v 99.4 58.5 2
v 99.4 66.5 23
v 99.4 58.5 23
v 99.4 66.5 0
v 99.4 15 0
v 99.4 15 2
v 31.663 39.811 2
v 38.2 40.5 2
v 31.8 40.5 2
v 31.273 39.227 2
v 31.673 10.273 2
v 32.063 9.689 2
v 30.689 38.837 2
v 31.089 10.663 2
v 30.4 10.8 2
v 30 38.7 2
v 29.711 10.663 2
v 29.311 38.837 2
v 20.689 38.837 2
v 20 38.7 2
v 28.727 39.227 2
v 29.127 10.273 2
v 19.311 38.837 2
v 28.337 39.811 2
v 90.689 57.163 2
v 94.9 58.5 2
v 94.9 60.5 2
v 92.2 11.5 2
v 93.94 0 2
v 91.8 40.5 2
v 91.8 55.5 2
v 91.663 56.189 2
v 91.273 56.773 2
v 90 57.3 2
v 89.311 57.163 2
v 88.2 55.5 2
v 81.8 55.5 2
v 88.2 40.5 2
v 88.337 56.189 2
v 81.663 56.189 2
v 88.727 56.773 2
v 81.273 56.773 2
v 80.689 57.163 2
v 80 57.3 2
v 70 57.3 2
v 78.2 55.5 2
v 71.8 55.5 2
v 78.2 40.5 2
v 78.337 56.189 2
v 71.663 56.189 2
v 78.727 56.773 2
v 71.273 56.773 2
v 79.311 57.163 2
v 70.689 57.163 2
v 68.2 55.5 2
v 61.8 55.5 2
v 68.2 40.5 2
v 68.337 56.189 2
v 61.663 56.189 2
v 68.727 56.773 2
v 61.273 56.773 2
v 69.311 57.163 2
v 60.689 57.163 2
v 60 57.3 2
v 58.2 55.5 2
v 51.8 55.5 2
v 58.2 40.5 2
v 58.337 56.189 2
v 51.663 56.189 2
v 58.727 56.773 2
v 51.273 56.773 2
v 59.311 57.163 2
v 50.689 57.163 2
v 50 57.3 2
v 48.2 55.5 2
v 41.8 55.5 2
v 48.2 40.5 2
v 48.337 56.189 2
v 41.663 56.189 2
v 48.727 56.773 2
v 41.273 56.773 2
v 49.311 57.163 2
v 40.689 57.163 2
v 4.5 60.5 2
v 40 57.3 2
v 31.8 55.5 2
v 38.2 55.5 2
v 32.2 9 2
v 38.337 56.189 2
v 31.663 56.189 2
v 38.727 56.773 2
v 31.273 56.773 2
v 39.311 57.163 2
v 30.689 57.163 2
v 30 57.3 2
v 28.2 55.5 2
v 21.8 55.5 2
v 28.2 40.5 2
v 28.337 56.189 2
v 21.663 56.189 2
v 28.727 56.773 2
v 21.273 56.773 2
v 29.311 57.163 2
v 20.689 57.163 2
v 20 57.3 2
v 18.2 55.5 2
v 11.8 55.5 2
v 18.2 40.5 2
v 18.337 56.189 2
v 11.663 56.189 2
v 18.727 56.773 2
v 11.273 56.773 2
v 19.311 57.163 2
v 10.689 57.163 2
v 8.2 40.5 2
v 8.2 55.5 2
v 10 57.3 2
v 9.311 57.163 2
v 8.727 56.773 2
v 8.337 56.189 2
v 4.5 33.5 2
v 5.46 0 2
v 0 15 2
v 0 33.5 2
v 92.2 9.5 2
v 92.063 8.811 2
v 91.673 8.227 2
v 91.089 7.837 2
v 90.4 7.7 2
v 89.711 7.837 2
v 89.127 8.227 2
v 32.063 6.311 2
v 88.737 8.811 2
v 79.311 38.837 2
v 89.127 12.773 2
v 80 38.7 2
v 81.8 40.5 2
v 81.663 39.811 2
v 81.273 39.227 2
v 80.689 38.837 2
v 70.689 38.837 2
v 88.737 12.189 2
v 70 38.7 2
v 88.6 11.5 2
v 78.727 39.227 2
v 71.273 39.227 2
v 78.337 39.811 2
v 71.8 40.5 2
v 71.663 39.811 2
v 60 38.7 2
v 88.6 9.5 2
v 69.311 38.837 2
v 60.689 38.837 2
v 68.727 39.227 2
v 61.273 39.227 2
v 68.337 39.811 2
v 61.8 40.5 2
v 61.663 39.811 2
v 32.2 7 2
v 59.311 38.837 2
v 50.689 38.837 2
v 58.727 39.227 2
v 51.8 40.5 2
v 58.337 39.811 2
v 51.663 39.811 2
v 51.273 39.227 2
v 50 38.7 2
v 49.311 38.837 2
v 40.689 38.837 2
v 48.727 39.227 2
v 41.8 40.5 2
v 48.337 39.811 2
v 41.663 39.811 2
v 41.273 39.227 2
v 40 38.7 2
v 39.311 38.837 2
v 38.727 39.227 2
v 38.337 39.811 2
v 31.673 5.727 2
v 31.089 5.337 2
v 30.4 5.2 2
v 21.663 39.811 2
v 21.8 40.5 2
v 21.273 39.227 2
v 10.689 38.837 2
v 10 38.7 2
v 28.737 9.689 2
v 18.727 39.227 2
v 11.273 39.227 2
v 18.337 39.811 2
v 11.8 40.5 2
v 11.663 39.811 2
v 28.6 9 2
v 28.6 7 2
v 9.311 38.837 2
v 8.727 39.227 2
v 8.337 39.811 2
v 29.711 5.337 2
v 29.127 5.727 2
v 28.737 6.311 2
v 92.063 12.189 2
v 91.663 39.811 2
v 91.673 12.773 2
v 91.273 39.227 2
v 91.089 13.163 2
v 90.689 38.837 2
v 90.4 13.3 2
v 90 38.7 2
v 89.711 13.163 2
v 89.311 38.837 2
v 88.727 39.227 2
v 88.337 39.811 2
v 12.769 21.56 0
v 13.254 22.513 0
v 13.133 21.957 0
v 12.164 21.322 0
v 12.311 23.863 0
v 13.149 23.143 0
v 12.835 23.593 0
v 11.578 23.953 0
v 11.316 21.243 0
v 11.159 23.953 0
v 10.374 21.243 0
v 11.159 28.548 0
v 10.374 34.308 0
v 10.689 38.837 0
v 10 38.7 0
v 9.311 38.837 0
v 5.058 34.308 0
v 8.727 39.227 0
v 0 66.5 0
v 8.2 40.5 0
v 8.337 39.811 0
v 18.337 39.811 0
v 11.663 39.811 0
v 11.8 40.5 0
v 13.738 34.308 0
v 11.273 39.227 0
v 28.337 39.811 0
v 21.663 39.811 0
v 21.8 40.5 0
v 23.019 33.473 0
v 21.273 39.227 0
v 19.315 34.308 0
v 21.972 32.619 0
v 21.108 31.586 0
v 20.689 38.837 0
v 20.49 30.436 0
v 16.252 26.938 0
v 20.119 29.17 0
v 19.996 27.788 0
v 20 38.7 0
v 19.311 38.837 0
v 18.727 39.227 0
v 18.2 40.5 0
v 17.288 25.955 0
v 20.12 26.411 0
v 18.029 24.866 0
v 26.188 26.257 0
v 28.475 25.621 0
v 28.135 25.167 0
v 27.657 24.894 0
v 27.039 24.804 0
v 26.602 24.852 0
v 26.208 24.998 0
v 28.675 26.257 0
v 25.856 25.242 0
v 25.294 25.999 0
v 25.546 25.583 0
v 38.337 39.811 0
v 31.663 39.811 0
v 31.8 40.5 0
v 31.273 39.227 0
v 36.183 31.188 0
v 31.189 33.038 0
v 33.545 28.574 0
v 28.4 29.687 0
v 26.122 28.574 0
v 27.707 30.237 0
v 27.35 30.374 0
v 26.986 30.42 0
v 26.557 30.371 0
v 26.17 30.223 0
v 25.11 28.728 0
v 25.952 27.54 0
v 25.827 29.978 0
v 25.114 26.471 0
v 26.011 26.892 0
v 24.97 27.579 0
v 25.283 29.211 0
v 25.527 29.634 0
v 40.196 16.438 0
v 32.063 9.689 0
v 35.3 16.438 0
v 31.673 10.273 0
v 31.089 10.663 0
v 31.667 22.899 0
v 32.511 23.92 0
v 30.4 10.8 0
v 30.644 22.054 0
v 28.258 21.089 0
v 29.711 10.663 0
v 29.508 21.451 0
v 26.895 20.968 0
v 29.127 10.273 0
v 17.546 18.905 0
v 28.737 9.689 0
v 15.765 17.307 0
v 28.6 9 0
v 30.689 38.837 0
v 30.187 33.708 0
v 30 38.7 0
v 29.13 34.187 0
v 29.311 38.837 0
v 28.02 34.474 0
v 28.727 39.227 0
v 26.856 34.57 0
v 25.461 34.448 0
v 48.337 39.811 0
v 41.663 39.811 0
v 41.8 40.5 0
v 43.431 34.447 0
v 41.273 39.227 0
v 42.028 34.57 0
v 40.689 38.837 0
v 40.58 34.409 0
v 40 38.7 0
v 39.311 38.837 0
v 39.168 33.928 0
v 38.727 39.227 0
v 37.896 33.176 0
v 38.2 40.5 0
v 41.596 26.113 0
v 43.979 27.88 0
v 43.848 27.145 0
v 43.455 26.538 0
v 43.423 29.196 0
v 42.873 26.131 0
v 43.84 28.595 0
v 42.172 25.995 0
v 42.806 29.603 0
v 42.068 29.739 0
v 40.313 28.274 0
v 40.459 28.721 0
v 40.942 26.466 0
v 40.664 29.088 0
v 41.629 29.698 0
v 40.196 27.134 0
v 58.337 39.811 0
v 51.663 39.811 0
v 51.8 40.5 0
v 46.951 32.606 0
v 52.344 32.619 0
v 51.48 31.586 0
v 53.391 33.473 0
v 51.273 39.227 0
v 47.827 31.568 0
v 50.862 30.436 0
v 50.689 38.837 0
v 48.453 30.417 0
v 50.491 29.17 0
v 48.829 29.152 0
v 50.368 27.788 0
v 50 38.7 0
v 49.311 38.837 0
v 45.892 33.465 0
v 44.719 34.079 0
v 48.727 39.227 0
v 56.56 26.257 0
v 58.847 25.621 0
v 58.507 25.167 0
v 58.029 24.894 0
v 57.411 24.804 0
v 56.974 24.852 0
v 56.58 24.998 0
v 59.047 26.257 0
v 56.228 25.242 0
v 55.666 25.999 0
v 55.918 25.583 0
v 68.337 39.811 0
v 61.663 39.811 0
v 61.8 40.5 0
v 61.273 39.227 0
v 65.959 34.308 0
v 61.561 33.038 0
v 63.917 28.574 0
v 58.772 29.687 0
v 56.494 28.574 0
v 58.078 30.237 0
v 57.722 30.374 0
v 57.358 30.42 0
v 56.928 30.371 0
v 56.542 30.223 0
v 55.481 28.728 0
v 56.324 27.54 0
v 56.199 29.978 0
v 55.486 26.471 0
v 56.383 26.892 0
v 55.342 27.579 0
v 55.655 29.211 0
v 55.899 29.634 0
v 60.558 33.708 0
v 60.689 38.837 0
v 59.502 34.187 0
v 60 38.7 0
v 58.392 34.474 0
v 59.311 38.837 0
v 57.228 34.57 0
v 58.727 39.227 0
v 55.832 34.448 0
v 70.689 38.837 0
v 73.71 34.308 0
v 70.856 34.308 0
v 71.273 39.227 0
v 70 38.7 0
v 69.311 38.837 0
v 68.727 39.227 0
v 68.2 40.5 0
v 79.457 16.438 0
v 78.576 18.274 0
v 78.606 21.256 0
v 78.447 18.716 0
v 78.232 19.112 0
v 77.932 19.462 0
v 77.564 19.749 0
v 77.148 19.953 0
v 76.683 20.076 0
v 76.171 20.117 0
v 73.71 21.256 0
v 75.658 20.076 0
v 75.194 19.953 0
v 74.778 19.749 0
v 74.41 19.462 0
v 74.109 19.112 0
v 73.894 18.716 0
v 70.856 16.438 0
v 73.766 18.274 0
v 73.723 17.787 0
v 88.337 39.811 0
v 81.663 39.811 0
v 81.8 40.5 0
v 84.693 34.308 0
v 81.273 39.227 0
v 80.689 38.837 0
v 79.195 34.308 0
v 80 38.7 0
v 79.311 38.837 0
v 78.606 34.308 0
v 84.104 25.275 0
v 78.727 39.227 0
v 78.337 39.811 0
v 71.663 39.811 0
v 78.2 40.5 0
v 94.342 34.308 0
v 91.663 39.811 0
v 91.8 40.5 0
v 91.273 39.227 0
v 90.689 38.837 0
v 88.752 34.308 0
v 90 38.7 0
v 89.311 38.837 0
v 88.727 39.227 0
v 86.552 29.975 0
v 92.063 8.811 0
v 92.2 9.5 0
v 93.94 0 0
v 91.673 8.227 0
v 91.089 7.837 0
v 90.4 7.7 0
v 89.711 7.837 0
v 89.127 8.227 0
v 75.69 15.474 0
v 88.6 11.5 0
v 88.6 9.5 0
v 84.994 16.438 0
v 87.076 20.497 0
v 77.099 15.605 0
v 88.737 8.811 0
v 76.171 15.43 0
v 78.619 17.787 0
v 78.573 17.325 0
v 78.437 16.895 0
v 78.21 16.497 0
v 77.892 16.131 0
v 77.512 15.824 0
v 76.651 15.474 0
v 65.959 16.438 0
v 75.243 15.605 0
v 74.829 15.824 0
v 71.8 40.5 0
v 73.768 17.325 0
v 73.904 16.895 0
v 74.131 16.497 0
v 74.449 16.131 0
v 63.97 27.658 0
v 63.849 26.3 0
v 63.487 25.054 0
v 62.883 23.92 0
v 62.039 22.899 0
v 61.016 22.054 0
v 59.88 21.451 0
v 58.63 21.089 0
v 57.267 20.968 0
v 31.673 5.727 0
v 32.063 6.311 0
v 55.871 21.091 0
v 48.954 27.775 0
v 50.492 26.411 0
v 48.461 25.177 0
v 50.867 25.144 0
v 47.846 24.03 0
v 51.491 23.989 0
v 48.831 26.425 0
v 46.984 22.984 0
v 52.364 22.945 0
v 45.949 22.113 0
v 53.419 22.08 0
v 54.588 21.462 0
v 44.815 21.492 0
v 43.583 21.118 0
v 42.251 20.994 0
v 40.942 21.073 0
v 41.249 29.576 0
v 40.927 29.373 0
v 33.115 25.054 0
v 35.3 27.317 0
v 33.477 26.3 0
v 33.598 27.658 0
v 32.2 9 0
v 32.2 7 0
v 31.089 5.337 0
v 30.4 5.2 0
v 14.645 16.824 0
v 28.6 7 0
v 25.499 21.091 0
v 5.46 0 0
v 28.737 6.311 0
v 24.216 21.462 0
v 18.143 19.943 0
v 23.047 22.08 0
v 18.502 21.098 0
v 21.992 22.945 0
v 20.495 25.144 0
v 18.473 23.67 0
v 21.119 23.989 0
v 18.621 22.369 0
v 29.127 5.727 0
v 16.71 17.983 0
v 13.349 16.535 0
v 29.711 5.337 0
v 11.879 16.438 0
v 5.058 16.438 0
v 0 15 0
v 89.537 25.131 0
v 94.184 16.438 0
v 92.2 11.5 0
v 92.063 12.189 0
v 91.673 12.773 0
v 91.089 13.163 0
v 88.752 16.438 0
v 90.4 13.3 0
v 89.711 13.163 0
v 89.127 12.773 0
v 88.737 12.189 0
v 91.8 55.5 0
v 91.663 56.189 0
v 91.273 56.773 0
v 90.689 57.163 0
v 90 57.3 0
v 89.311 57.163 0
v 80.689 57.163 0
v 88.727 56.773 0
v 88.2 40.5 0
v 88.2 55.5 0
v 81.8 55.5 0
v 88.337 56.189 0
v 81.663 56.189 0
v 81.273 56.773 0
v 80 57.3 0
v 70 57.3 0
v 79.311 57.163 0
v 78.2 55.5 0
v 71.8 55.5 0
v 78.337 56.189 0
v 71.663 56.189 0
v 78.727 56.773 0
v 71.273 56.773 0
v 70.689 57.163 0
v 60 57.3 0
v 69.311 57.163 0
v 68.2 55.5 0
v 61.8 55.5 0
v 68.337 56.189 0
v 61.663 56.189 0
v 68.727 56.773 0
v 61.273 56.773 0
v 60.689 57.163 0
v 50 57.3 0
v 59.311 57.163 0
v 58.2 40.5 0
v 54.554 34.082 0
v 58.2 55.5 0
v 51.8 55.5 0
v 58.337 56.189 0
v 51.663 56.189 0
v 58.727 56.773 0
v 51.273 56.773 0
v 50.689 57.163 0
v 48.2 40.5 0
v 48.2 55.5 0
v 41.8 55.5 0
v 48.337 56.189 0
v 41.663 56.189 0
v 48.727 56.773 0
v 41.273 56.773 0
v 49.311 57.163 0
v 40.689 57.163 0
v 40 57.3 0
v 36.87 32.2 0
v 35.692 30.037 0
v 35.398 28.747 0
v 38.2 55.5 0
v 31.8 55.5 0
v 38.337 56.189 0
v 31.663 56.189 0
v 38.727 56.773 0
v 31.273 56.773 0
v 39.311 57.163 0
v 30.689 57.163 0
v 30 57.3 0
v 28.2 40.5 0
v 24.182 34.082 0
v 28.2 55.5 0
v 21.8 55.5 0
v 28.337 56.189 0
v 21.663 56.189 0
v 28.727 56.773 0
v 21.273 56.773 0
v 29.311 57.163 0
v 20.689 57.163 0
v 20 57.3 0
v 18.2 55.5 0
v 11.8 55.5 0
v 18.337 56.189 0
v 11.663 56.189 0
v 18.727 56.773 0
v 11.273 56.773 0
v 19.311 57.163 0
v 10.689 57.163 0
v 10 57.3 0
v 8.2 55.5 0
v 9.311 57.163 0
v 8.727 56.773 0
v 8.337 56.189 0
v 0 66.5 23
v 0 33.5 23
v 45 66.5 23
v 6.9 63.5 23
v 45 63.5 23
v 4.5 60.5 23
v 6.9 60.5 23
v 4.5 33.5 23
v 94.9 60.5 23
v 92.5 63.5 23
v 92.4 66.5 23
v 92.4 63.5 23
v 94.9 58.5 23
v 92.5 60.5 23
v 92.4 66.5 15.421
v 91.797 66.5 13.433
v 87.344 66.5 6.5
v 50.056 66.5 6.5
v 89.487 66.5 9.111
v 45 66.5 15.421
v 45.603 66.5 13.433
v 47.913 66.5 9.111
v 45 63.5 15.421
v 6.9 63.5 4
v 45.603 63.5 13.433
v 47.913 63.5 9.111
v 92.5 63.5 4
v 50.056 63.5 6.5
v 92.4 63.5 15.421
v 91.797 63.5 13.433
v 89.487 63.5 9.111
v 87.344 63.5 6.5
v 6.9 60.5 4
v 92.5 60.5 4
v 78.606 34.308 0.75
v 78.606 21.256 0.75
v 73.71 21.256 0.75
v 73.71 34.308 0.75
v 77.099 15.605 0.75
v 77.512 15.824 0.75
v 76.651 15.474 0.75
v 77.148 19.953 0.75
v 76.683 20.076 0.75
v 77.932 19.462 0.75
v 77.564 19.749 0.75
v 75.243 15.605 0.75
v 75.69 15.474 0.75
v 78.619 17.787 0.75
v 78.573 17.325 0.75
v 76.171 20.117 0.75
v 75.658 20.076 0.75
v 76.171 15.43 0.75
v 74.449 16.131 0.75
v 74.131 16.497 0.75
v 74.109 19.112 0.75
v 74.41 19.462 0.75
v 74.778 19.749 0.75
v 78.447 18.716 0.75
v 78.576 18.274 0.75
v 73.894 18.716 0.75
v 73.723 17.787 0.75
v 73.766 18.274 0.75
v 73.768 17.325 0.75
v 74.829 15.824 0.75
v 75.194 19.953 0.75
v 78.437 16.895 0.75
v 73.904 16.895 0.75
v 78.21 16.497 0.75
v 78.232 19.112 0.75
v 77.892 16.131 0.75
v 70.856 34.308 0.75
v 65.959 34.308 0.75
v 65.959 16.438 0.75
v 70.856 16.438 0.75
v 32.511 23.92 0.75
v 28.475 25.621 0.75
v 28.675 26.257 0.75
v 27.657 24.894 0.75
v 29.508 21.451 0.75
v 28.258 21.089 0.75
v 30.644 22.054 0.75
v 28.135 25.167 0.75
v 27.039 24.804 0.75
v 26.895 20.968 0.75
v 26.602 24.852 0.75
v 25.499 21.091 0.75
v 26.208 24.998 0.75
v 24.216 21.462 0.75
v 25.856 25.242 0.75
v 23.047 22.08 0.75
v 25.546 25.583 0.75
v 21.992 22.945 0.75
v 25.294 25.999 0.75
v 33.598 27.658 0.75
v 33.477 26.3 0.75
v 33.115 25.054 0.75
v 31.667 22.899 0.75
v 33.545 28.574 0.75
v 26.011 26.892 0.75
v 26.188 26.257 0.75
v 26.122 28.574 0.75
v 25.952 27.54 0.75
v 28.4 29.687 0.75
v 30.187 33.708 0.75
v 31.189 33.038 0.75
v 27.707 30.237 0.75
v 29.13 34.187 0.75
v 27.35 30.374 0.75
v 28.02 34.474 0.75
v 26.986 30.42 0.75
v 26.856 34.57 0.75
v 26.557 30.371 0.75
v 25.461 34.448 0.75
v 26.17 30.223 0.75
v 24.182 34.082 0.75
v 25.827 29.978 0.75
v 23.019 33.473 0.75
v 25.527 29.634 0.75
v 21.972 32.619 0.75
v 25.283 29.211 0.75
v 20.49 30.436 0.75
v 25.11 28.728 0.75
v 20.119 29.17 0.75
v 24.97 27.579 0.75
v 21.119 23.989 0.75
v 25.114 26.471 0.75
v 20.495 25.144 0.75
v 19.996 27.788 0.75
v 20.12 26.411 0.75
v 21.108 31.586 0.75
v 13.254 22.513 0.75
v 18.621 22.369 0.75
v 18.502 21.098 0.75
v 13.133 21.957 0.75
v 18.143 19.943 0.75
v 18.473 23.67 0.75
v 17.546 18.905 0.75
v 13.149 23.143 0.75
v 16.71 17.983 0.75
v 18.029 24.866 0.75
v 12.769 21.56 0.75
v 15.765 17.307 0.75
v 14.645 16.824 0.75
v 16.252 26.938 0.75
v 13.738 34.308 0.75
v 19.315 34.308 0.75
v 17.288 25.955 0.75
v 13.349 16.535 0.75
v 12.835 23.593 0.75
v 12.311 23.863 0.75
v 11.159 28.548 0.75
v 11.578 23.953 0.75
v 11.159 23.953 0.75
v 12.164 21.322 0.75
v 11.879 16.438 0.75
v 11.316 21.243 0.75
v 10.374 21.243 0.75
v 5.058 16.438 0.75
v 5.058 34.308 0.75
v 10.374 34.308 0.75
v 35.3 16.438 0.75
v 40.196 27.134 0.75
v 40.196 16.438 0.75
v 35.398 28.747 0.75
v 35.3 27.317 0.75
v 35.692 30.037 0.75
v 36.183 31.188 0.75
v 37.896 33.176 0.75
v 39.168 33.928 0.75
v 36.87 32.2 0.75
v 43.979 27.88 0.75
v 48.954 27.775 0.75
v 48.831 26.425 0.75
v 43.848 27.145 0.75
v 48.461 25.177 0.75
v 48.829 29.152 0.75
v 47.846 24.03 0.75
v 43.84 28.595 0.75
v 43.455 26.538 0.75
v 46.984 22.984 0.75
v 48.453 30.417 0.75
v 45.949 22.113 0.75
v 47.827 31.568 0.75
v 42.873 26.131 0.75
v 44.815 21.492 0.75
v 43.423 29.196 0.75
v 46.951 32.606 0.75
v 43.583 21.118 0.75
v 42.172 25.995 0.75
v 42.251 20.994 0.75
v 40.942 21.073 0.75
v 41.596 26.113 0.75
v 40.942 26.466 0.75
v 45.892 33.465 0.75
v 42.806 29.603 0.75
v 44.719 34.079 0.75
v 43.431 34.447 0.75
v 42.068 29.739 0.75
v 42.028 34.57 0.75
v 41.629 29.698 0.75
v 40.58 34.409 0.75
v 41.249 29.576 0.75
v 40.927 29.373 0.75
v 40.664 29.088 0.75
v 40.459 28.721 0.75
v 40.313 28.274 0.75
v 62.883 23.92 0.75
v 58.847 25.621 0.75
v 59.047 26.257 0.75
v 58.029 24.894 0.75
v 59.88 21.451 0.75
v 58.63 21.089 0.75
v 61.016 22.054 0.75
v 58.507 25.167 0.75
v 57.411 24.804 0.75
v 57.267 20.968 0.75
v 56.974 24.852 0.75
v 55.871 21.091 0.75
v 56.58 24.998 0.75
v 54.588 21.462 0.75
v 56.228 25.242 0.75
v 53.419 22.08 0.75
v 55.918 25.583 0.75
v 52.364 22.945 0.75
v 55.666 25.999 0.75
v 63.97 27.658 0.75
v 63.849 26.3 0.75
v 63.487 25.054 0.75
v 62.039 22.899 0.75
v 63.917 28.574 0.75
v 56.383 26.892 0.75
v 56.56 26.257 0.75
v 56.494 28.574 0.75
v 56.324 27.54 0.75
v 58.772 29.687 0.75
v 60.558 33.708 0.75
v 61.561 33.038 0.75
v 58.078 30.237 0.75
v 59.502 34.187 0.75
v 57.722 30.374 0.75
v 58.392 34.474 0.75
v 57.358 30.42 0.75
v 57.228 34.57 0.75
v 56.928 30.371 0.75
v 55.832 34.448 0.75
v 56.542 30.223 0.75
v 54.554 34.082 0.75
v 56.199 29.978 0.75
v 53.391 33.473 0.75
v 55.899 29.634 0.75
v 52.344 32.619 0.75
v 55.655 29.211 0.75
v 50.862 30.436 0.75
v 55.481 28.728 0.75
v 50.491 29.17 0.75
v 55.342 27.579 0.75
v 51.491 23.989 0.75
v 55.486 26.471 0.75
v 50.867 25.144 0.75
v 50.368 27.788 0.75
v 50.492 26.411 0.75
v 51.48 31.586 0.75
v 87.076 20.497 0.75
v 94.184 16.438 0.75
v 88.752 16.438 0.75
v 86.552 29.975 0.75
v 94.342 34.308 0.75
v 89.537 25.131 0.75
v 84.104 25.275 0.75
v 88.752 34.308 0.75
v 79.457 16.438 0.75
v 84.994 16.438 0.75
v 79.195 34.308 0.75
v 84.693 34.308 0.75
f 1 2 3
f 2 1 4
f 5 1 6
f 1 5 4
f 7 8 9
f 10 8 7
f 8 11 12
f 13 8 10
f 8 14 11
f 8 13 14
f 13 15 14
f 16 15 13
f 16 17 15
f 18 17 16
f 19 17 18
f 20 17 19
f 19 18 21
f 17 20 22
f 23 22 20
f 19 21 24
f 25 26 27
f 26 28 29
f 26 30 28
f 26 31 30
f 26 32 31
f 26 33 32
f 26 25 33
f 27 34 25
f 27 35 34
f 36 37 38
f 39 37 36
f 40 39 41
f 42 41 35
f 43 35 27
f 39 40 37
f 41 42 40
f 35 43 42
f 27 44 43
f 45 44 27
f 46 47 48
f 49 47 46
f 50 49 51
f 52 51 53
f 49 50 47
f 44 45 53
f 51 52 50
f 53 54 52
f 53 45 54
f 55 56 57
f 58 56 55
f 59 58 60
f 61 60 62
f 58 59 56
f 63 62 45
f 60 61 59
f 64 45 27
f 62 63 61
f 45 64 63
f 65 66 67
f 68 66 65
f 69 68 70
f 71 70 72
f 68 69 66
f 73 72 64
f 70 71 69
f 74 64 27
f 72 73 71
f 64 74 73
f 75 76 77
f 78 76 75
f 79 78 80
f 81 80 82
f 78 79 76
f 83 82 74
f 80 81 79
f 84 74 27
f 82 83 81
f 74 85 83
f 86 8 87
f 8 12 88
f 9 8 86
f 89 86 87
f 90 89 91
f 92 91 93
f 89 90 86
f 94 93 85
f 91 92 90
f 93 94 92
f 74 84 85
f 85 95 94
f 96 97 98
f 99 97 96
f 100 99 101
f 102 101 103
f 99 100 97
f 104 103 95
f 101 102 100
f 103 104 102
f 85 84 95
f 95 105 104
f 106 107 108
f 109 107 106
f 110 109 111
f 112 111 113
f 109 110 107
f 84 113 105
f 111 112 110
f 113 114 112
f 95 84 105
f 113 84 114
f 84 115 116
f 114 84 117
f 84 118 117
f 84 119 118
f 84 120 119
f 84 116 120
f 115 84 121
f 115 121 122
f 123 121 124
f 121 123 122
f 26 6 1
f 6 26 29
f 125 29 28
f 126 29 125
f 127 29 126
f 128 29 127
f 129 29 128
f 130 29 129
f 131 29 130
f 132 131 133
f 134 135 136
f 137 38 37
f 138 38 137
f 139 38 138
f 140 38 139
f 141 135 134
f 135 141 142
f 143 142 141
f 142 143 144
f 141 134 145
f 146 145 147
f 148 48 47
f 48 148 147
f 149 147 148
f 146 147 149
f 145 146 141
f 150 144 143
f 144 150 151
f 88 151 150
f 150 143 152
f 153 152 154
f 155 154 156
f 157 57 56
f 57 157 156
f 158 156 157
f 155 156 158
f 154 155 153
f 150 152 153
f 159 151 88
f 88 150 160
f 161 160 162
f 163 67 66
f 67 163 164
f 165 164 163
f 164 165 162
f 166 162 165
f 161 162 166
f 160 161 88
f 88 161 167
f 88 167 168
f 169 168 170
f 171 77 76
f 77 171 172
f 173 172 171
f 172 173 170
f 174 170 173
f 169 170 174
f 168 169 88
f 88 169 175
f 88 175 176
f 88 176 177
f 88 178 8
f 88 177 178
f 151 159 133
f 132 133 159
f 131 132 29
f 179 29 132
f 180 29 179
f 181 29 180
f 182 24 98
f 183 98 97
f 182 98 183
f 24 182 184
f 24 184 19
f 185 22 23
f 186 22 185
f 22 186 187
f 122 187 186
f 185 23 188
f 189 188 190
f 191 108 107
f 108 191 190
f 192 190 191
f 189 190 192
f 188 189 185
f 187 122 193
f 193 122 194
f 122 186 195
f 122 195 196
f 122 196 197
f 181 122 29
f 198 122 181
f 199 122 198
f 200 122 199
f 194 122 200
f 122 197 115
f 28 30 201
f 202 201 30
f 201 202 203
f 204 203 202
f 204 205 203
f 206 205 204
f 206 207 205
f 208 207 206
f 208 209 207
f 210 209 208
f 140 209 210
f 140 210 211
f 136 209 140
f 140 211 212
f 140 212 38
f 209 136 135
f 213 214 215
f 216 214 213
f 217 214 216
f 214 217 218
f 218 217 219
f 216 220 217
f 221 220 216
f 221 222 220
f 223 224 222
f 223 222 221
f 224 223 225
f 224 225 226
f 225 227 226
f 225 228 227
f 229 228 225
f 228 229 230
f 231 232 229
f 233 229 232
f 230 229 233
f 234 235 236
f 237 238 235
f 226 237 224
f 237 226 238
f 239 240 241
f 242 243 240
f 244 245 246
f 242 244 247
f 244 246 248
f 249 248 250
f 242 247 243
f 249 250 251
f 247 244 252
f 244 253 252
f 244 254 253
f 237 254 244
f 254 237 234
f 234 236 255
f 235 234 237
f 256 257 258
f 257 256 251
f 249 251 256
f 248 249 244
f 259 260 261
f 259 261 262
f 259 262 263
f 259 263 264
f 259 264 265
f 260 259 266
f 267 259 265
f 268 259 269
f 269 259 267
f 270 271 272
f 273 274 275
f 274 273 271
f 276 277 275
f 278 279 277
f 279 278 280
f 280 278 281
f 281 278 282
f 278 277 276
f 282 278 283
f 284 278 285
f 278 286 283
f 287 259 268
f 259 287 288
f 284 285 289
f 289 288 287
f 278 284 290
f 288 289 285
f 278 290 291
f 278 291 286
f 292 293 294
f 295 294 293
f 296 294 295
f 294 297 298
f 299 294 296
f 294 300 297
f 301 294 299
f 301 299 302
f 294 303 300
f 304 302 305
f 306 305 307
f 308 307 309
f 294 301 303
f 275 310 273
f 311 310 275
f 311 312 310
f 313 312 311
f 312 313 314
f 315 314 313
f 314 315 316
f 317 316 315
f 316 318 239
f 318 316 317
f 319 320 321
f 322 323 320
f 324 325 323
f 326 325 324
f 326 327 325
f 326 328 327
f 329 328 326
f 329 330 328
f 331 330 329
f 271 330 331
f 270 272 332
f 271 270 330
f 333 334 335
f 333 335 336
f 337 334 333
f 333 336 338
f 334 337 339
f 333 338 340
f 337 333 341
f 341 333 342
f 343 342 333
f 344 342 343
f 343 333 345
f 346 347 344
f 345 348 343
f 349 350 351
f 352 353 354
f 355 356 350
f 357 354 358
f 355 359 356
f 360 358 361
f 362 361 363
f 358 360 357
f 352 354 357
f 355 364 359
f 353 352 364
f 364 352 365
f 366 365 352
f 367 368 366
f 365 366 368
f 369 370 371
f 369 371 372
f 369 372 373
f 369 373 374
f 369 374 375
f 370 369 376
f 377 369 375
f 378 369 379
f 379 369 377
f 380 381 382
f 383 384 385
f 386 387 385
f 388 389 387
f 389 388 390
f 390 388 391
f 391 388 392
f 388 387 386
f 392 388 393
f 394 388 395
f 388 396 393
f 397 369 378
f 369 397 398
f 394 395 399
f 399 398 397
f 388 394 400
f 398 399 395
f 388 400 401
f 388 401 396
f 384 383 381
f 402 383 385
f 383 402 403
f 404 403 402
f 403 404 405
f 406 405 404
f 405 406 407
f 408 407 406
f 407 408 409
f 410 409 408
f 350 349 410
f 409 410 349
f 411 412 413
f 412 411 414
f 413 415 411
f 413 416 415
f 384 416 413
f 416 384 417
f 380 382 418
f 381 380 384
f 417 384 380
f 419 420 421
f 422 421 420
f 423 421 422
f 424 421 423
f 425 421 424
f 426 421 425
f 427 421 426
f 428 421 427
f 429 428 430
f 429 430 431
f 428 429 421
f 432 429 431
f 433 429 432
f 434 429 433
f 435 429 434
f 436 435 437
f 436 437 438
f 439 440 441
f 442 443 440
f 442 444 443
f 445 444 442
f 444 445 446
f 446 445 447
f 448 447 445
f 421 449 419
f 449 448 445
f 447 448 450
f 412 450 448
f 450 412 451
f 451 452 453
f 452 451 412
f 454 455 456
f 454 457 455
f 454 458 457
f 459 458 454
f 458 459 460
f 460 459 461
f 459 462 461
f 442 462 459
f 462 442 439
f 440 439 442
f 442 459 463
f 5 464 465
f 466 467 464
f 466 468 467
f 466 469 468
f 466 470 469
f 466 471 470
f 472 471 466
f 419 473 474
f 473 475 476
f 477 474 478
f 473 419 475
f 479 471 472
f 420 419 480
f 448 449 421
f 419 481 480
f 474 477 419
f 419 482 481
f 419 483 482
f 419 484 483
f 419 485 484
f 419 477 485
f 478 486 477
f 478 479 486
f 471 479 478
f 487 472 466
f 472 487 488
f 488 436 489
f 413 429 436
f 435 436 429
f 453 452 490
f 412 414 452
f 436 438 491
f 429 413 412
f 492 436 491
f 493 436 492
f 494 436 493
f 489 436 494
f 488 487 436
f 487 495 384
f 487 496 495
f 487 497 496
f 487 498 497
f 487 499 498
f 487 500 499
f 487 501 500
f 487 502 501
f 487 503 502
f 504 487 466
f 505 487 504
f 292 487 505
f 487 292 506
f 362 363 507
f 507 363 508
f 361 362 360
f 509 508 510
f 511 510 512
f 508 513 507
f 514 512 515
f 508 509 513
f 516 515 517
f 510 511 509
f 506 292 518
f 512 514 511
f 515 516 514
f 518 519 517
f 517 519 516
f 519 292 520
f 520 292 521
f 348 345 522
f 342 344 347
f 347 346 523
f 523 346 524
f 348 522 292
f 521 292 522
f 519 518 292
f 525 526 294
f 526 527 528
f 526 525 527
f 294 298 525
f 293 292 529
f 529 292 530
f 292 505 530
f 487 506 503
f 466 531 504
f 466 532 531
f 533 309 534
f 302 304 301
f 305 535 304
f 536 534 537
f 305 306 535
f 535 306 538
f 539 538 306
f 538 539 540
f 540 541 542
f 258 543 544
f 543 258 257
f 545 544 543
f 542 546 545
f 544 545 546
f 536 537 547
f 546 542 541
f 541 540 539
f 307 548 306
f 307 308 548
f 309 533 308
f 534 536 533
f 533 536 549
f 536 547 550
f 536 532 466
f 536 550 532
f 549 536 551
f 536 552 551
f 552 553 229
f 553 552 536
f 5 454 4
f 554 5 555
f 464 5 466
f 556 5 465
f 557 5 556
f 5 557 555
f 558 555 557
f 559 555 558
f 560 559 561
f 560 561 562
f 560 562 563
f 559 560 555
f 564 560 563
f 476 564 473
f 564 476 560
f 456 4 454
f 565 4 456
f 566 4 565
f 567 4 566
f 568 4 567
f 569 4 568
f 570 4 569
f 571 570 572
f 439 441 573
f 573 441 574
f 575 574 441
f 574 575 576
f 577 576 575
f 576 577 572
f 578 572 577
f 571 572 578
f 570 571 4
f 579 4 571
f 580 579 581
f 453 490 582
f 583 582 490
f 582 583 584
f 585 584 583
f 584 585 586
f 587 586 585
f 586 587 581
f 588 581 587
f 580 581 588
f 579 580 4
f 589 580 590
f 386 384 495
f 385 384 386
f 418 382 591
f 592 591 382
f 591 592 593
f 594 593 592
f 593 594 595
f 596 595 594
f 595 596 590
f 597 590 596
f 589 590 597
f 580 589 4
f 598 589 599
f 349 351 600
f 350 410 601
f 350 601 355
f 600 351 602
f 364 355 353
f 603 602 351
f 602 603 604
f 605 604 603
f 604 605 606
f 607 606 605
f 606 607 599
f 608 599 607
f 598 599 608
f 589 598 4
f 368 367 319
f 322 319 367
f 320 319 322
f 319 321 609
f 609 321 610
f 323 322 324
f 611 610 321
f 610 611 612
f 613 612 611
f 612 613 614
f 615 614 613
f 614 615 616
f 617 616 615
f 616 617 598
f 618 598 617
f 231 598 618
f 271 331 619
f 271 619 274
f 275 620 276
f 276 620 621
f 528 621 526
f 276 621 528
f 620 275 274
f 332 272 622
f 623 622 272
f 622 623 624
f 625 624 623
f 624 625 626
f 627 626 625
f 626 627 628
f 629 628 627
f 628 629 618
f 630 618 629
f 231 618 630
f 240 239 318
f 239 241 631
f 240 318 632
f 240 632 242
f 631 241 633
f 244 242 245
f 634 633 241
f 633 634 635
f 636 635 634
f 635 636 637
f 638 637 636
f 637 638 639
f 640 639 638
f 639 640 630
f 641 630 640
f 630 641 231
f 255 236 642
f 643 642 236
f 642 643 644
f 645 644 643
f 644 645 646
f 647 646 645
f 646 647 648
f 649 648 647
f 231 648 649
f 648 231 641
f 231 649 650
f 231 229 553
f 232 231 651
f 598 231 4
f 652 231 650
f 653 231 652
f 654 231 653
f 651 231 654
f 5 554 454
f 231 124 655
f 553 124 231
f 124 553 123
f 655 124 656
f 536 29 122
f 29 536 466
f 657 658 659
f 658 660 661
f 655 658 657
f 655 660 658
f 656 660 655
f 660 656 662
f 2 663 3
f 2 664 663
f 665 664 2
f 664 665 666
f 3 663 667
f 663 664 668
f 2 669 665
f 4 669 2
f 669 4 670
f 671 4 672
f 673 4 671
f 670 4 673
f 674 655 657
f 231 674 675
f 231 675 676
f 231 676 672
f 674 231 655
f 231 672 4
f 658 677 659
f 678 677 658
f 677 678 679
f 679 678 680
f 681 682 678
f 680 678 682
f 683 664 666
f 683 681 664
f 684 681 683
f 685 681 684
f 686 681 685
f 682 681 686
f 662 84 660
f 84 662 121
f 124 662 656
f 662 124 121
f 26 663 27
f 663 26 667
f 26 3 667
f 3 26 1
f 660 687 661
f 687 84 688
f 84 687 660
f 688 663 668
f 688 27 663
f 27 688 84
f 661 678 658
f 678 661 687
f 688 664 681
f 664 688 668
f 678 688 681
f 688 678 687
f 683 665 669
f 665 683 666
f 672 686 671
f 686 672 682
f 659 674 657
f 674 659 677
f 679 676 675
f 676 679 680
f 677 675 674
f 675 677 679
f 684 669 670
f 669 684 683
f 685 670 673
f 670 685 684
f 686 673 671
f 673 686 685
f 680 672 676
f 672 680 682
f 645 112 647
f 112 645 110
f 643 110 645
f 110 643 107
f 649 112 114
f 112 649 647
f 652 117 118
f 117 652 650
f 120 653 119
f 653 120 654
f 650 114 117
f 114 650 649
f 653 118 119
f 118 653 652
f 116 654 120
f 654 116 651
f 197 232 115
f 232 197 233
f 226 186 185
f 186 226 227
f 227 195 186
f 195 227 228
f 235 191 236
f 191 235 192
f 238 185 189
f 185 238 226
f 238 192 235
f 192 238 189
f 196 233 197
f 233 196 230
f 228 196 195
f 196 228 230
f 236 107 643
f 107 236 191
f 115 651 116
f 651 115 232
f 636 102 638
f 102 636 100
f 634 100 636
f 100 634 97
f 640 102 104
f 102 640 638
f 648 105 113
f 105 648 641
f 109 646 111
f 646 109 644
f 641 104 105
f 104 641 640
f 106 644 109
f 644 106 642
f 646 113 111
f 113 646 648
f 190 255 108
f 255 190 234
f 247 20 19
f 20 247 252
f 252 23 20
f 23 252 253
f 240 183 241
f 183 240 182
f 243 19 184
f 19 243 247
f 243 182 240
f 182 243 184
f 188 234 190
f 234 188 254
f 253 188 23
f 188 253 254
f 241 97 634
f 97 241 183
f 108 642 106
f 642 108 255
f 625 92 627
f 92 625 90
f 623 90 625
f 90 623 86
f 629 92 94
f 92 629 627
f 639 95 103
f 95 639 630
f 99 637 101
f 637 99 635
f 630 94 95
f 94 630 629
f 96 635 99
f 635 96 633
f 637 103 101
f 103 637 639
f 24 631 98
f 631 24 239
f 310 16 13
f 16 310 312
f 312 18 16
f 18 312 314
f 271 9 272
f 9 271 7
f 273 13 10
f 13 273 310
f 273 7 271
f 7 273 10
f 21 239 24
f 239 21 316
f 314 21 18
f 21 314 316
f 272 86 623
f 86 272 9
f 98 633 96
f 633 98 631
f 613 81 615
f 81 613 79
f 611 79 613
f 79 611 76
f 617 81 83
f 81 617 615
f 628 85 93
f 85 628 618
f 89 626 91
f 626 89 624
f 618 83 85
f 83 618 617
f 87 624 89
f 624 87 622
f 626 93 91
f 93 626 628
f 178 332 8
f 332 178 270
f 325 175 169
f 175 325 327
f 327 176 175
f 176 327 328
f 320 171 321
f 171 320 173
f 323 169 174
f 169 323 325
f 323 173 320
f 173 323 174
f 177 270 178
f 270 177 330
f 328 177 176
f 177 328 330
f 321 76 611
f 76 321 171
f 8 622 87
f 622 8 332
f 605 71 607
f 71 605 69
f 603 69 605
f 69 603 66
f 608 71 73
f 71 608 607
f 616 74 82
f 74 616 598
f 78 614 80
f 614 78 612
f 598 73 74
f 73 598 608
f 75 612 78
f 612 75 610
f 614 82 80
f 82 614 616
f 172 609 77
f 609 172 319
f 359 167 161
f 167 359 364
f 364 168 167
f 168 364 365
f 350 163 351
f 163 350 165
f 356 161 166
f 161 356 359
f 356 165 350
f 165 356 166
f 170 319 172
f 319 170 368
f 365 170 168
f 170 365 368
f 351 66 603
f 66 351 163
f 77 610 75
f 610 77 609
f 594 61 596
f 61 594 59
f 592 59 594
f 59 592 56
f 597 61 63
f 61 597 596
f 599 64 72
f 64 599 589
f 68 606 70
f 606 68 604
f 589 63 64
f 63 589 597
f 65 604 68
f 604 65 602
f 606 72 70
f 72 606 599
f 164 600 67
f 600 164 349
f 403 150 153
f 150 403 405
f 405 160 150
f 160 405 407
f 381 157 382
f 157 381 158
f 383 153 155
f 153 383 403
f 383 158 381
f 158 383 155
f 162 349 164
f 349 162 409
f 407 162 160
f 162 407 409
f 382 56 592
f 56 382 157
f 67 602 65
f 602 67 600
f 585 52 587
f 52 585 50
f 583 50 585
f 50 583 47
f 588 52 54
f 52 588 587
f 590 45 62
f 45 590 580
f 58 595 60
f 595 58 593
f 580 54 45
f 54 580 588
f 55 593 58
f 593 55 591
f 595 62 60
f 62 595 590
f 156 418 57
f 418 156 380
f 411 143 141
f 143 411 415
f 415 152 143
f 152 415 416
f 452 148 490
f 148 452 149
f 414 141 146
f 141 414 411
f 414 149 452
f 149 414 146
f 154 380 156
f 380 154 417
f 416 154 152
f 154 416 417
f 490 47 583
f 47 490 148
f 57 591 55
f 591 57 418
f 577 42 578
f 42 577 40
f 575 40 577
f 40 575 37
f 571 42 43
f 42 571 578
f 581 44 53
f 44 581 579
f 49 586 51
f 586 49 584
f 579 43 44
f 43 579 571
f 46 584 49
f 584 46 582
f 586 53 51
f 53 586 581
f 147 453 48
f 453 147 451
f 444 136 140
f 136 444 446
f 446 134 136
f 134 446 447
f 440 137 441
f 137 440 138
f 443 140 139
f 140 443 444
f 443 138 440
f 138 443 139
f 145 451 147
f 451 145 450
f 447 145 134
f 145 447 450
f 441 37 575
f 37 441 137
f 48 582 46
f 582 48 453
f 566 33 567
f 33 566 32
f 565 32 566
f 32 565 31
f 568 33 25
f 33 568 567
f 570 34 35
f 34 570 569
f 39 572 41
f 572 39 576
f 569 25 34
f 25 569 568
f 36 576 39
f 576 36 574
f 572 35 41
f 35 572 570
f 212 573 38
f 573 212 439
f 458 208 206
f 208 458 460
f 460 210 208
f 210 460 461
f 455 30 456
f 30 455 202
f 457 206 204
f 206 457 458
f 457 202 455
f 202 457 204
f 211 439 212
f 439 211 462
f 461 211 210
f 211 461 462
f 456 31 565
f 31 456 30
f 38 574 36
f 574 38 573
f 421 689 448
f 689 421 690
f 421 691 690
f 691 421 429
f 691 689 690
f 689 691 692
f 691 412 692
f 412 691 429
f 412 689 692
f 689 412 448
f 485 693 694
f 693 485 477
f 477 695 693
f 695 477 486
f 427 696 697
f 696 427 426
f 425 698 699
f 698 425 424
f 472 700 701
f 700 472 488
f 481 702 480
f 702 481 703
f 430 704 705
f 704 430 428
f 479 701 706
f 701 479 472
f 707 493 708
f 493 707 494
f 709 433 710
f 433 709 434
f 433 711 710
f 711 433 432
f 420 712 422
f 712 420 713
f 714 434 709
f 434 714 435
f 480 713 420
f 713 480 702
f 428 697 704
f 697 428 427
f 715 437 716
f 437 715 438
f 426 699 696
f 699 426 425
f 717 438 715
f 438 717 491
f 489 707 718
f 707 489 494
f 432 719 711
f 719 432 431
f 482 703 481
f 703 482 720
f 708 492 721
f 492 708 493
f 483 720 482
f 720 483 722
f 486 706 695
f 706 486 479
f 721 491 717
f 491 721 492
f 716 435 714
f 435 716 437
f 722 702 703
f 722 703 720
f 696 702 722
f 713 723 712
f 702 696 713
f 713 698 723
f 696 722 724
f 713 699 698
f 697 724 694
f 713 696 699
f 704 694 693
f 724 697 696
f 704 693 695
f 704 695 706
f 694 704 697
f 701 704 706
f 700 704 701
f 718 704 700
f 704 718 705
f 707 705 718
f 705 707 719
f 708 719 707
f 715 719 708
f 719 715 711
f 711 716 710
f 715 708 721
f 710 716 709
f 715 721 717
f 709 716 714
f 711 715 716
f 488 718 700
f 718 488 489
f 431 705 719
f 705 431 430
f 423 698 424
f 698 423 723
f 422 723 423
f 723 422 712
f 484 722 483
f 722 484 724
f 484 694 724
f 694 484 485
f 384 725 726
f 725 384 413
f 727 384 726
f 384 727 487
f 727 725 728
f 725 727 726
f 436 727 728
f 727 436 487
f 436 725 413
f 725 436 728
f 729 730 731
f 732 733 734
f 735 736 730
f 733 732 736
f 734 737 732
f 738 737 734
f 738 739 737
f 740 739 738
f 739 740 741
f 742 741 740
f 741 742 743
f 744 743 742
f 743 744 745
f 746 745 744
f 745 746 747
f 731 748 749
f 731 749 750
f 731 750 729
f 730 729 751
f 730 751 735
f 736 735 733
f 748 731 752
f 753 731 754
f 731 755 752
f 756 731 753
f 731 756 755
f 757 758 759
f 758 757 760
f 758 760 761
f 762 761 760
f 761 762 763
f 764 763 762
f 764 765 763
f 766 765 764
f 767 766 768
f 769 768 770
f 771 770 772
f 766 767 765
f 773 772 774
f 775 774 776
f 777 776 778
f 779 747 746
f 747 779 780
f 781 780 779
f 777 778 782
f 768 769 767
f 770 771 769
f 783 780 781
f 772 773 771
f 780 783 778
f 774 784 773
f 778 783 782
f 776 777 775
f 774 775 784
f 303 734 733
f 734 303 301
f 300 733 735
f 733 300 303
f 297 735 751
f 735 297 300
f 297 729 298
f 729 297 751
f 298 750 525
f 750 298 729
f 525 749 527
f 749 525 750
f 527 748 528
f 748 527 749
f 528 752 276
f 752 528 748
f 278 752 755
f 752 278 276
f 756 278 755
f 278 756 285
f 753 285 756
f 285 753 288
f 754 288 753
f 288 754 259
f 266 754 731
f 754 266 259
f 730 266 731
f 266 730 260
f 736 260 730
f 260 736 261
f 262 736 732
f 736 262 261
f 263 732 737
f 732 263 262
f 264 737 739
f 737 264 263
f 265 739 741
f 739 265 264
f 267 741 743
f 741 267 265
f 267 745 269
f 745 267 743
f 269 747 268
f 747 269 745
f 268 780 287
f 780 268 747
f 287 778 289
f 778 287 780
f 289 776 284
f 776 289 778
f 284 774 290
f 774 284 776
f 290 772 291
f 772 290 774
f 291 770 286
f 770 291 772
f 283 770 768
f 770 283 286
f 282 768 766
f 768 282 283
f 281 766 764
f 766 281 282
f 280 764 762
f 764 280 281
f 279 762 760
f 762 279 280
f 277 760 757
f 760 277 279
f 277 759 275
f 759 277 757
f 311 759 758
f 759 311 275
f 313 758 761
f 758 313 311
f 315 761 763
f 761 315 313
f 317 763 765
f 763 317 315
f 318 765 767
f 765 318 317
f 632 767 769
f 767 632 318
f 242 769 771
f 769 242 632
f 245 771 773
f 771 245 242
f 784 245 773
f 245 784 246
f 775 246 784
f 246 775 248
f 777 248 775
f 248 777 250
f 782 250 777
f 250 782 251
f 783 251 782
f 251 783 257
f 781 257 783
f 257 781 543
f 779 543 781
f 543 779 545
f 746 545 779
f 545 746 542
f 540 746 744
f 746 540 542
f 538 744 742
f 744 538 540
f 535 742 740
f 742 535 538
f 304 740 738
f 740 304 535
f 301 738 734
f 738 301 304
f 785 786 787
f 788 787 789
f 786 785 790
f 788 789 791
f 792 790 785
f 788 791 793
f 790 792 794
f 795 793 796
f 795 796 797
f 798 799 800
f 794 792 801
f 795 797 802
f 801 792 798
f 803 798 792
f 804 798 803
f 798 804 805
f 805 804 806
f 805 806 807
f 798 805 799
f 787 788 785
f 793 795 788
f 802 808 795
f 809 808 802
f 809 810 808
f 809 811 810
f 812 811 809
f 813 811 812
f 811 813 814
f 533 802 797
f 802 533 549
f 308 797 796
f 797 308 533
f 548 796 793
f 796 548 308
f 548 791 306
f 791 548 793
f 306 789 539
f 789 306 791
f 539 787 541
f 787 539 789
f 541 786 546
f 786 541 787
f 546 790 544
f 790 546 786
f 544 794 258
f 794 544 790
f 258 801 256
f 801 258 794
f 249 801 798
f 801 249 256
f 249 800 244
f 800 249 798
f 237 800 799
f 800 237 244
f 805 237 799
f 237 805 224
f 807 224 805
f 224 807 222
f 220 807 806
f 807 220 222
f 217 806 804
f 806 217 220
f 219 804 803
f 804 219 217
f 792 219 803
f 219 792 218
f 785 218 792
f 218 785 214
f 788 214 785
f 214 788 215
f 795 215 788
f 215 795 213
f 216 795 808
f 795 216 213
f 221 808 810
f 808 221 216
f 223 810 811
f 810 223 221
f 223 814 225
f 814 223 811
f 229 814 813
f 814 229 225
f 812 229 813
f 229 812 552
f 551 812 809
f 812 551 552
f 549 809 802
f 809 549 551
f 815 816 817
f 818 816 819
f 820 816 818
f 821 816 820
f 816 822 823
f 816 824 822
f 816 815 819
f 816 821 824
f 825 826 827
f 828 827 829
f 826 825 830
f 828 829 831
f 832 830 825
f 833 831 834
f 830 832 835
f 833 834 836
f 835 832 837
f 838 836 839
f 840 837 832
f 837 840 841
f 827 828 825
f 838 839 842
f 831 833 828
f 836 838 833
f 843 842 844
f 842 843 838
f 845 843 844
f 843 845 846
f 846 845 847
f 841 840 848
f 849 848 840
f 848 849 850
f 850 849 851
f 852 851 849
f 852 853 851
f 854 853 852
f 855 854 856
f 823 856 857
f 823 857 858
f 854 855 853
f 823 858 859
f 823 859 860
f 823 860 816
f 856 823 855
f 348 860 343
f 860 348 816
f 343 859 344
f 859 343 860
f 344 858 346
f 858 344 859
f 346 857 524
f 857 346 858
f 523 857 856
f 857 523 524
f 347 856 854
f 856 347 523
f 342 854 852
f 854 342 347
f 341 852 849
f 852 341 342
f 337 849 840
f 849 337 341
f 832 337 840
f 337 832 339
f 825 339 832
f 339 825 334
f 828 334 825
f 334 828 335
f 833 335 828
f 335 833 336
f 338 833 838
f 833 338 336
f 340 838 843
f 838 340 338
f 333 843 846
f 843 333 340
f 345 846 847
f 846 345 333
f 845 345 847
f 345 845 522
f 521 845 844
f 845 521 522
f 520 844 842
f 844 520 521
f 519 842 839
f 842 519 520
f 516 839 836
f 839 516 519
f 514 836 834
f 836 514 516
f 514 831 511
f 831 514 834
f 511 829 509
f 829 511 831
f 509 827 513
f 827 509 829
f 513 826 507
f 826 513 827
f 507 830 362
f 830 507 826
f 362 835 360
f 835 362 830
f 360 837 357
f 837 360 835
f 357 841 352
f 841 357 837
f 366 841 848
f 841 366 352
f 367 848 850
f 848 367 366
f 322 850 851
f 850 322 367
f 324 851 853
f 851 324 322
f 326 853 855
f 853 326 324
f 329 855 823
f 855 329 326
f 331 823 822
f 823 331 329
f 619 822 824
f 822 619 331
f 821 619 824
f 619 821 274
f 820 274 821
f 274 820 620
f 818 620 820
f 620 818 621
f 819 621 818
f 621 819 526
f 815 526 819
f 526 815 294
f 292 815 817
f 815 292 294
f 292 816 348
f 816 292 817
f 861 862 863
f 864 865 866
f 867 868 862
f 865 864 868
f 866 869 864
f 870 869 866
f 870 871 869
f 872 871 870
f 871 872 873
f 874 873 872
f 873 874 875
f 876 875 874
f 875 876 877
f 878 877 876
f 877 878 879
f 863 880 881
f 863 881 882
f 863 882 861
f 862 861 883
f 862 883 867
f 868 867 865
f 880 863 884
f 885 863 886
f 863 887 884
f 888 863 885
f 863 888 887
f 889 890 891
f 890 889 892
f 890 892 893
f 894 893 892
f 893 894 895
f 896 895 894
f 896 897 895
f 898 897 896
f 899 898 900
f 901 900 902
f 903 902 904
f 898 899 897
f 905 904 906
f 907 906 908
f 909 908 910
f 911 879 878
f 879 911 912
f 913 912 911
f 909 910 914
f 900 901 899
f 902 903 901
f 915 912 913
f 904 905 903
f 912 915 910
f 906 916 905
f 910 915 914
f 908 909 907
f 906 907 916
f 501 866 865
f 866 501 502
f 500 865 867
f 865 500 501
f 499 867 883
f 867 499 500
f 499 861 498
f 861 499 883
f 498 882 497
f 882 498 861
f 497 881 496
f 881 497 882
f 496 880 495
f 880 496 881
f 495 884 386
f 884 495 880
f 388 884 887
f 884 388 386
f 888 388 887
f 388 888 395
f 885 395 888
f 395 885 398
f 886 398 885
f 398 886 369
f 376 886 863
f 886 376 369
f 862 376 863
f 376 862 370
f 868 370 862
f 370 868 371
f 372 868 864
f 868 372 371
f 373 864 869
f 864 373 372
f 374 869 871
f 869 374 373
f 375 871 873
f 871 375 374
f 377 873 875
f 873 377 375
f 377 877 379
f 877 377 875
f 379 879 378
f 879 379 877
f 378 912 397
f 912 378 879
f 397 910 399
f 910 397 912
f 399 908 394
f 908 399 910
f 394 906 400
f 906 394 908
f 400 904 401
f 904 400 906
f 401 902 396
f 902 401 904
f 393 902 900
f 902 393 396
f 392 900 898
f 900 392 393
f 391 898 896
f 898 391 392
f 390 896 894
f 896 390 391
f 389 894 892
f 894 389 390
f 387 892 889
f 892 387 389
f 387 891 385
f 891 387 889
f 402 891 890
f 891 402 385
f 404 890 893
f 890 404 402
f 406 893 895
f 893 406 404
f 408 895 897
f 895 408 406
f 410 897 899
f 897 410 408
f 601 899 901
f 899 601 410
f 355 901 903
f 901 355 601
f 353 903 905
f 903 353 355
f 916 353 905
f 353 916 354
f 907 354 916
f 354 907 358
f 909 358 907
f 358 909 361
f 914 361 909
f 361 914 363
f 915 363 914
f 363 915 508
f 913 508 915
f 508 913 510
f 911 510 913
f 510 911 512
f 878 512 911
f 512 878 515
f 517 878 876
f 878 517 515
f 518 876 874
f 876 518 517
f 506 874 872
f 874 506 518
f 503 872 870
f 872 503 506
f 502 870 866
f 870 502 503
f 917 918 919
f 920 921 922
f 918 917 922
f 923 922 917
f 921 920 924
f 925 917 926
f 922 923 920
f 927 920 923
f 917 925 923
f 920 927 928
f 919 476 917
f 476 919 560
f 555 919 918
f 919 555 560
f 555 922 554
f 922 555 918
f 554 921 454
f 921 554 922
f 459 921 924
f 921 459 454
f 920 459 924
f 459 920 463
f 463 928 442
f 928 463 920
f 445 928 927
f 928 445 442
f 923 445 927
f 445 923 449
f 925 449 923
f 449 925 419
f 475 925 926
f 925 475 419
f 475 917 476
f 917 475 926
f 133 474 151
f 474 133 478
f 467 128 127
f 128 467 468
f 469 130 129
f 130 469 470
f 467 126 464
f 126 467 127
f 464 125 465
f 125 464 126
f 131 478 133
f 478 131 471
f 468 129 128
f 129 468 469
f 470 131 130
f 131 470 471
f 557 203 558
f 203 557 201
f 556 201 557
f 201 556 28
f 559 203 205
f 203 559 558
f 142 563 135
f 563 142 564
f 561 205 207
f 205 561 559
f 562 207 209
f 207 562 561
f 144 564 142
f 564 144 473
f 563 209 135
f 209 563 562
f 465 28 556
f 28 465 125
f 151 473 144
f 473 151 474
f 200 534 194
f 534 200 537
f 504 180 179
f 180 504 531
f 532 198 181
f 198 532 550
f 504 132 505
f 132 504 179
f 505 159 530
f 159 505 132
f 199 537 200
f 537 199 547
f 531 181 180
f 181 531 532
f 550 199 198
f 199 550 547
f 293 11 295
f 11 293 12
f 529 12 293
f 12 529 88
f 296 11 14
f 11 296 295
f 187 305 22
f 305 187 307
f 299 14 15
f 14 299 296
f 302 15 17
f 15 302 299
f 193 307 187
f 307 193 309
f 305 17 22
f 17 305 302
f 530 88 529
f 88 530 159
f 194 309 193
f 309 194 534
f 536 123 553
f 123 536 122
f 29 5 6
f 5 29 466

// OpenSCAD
// file: ../../inc/text_RebeliX.scad
// Module names are of the form poly_<inkscape-path-id>().  As a result,
// you can associate a polygon in this OpenSCAD program with the corresponding
// SVG element in the Inkscape document by looking for the XML element with
// the attribute id="inkscape-path-id".

// fudge value is used to ensure that subtracted solids are a tad taller
// in the z dimension than the polygon being subtracted from.  This helps
// keep the resulting .stl file manifold.
fudge = 0.1;

module poly_path3169(h)
{
  scale([25.4/90, -25.4/90, 1]) union()
  {
    linear_extrude(height=h)
      polygon([[74.960940,-30.336910],[74.960940,32.980960],[57.612310,32.980960],[57.612310,-30.336910]]);
  }
}

module poly_path3163(h)
{
  scale([25.4/90, -25.4/90, 1]) union()
  {
    linear_extrude(height=h)
      polygon([[-57.241210,12.663580],[-83.542480,12.663580],[-84.145510,8.999020],[-83.936785,6.702904],[-83.310550,4.453130],[-74.497070,4.453130],[-75.207384,2.200490],[-76.410545,0.591455],[-78.106554,-0.373975],[-80.295410,-0.695800],[-81.843581,-0.523282],[-83.240985,-0.005773],[-84.487624,0.856725],[-85.583500,2.064210],[-86.476452,3.541354],[-87.114271,5.212729],[-87.624510,9.138180],[-87.131669,13.208634],[-86.515593,14.922040],[-85.653080,16.420900],[-84.590546,17.638558],[-83.374347,18.508312],[-82.004486,19.030160],[-80.480960,19.204100],[-79.193740,19.041757],[-77.929706,18.554700],[-75.471190,16.606450],[-65.590820,28.481450],[-69.142321,30.855868],[-72.885155,32.551880],[-76.819321,33.569488],[-80.944820,33.908690],[-85.887918,33.476714],[-90.419325,32.180786],[-94.539042,30.020905],[-98.247070,26.997070],[-101.311495,23.335423],[-103.500369,19.262092],[-104.813691,14.777075],[-105.251460,9.880370],[-104.809342,4.998187],[-103.482975,0.510280],[-101.272357,-3.583352],[-98.177490,-7.282710],[-94.439019,-10.347111],[-90.297559,-12.535976],[-85.753107,-13.849308],[-80.805660,-14.287110],[-75.974212,-13.859454],[-71.545737,-12.576562],[-67.520234,-10.438434],[-63.897700,-7.445070],[-60.904336,-3.825435],[-58.766207,0.191373],[-57.483316,4.605353],[-57.055660,9.416510],[-57.241210,12.663580]]);
  }
}

module poly_path3161(h)
{
  scale([25.4/90, -25.4/90, 1]) union()
  {
    linear_extrude(height=h)
      polygon([[-139.345700,-13.312990],[-139.345700,32.980960],[-158.178710,32.980960],[-158.178710,-30.336910],[-134.011230,-30.336910],[-128.801443,-29.994775],[-124.212065,-28.968459],[-120.243095,-27.257961],[-116.894530,-24.863280],[-113.931608,-21.595888],[-111.815224,-17.916832],[-110.545377,-13.826113],[-110.122070,-9.323730],[-110.646849,-4.711132],[-112.221109,-0.475439],[-114.844850,3.383352],[-118.518070,6.865240],[-107.663570,32.980960],[-127.424320,32.980960],[-136.562500,12.570800],[-136.562500,-3.710940],[-135.078120,-3.710940],[-132.480483,-4.029825],[-130.625022,-4.986543],[-129.511735,-6.581093],[-129.140620,-8.813480],[-129.569720,-10.781990],[-130.856959,-12.188077],[-133.002339,-13.031743],[-136.005860,-13.312990]]);
  }
}

module poly_path3165(h)
{
  scale([25.4/90, -25.4/90, 1]) union()
  {
    linear_extrude(height=h)
      polygon([[-33.676760,-30.336910],[-33.676760,7.561040],[-33.262190,11.599593],[-32.743966,13.186166],[-32.018450,14.484269],[-31.085641,15.493903],[-29.945540,16.215067],[-28.598146,16.647763],[-27.043460,16.791990],[-24.428426,16.310744],[-22.242430,14.866940],[-20.763879,12.738967],[-20.271000,10.205080],[-20.734889,7.601642],[-22.126460,5.450440],[-24.190692,4.006674],[-26.672360,3.525390],[-28.713395,3.942892],[-31.032710,5.195310],[-31.032710,-13.916010],[-26.394040,-14.194330],[-21.675662,-13.753634],[-17.308071,-12.431605],[-13.291265,-10.228244],[-9.625240,-7.143550],[-6.570995,-3.438394],[-4.389379,0.626248],[-3.080394,5.050376],[-2.644040,9.833990],[-3.087641,14.713297],[-4.418369,19.192514],[-6.636225,23.271641],[-9.741210,26.950680],[-13.492759,29.994812],[-17.650175,32.169190],[-22.213461,33.473815],[-27.182620,33.908690],[-32.314164,33.340452],[-37.318110,31.635740],[-41.823436,28.968510],[-45.458980,25.512700],[-47.894289,21.926430],[-49.633791,17.847300],[-50.677491,13.275307],[-51.025390,8.210450],[-51.025390,-30.336910]]);
  }
}

module poly_path3167(h)
{
  scale([25.4/90, -25.4/90, 1]) union()
  {
    linear_extrude(height=h)
      polygon([[50.375980,12.663580],[24.074710,12.663580],[23.471680,8.999020],[23.680405,6.702904],[24.306640,4.453130],[33.120120,4.453130],[32.409806,2.200490],[31.206645,0.591455],[29.510636,-0.373975],[27.321780,-0.695800],[25.773609,-0.523282],[24.376205,-0.005773],[23.129566,0.856725],[22.033690,2.064210],[21.140734,3.541354],[20.502915,5.212729],[19.992680,9.138180],[20.485521,13.208634],[21.101597,14.922040],[21.964110,16.420900],[23.026644,17.638558],[24.242843,18.508312],[25.612704,19.030160],[27.136230,19.204100],[28.423444,19.041757],[29.687476,18.554700],[32.146000,16.606450],[42.026370,28.481450],[38.474864,30.855868],[34.732030,32.551880],[30.797863,33.569488],[26.672360,33.908690],[21.729267,33.476714],[17.197864,32.180786],[13.078148,30.020905],[9.370120,26.997070],[6.305695,23.335423],[4.116820,19.262092],[2.803495,14.777075],[2.365720,9.880370],[2.807843,4.998187],[4.134214,0.510280],[6.344832,-3.583352],[9.439700,-7.282710],[13.178171,-10.347111],[17.319630,-12.535976],[21.864079,-13.849308],[26.811520,-14.287110],[31.642968,-13.859454],[36.071443,-12.576562],[40.096946,-10.438434],[43.719480,-7.445070],[46.712849,-3.825435],[48.850976,0.191373],[50.133866,4.605353],[50.561520,9.416510],[50.375980,12.663580]]);
  }
}

module poly_path3171(h)
{
  scale([25.4/90, -25.4/90, 1]) union()
  {
    linear_extrude(height=h)
      polygon([[102.421880,-13.266600],[102.421880,32.980960],[85.073240,32.980960],[85.073240,-13.266600]]);
    linear_extrude(height=h)
      polygon([[93.793950,-33.908690],[95.497200,-33.753545],[97.081591,-33.288215],[98.547124,-32.512700],[99.893800,-31.427000],[101.020116,-30.129588],[101.824631,-28.719131],[102.307345,-27.195629],[102.468260,-25.559080],[102.316042,-23.831146],[101.859419,-22.265584],[101.098391,-20.862395],[100.032960,-19.621580],[98.729775,-18.606843],[97.255545,-17.882040],[95.610270,-17.447172],[93.793950,-17.302240],[91.977613,-17.447172],[90.332331,-17.882040],[88.858104,-18.606843],[87.554930,-19.621580],[86.489482,-20.862395],[85.728449,-22.265584],[85.271831,-23.831146],[85.119630,-25.559080],[85.280529,-27.195629],[85.763240,-28.719131],[86.567761,-30.129588],[87.694090,-31.427000],[89.040749,-32.512700],[90.506278,-33.288215],[92.090677,-33.753545],[93.793950,-33.908690]]);
  }
}

module poly_path3173(h)
{
  scale([25.4/90, -25.4/90, 1]) union()
  {
    linear_extrude(height=h)
      polygon([[157.622070,-30.336910],[141.154790,0.463870],[158.178710,32.980960],[138.371580,32.980960],[130.578610,17.626950],[123.991700,32.980960],[104.509280,32.980960],[121.904300,0.974120],[105.437010,-30.336910],[125.058590,-30.336910],[132.434080,-15.957030],[138.371580,-30.336910]]);
  }
}

module text_RebeliX(h)
{

poly_path3169(h);
poly_path3163(h);
poly_path3161(h);
poly_path3165(h);
poly_path3167(h);
poly_path3171(h);
poly_path3173(h);
}

text_RebeliX(2);
// file: ../../../configuration.scad
// Vyska vrstvy pro tisknuti dilu [mm]
layer_height = 0.25; //Slic3r->Print Settings->Layers and perimeters->Layer height

// Rezerva prumeru hlavy sroubu [mm]
spare = 1;
// Prumer hlavy M6 sroubu (pricte se rezerva) [mm]
M6_head_diameter = 10.6+spare;
//M6_head_diameter = 12+spare;

// Vyska hlavy M6 sroubu (dulezite pro zapusteni hlavy sroubu do plastu) [mm]
M6_head_height = 3.6;
//M6_head_height = 4.5;

//Prumery sroubu a tyci
M8_smooth_rod_diameter = 8.1;
M8_smooth_rod_diameter_catch = 8.2;
M6_diameter = 6.2;
M6_diamater_horizontal = 6.5;
M3_diameter = 3.2;
M3_diameter_horizontal = 3.2;

//Prumery matic
M3_nut_diameter = 6.8;
M3_nut_diameter_horizontal = 6.8;

//ALU profile parameters
ALU_cut_width = 7.9;
ALU_cut_width_horizontal = 7.9;

// Delka motoru (ovlivni dily pro osy Z a Y)
//SX17-1003LQFE (doporuceno hlavne na osu Z)
//motor_length = 29.5;
//SX17-1003 (doporuceno hlavne na osu Z)
motor_length = 34;
//SX17-1005
//motor_length = 40;
//SX17-0905 - zde je jiz problem s velkou vyskou motoru na ose Z - musi se upravit endstop-holder
//motor_length = 48;

// Sirka vytlacovaneho materialu [mm]
extrusion_width = 0.66; //Slic3r->Print Settings->Advanced->Default extrusion width

/// Vyberte typ remenu ******************************************************

// GT2 
//belt_tooth_distance = 2;
//belt_tooth_ratio = 0.5;

// T2.5
belt_tooth_distance = 2.5;
belt_tooth_ratio = 0.68;
// main file
// RebeliX
//
// Zadni kryt zdroje 12V / 240W zadni cast
// GNU GPL v3
// Martin Neruda <neruda@reprap4u.cz>
// http://www.reprap4u.cz

include <../../../configuration.scad>
use <../../inc/text_RebeliX.scad>

sirka = 98.5+0.9;
sirka_vnitrni = 90.7;
vyska = 23;
hloubka = 45;
tloustka_steny = 2;
plech_tloustka = 2 + 0.4;

hloubka_dilu = hloubka + 2*tloustka_steny + 1.5;

module power_base(){
	translate([0,0,0]) cube([sirka,hloubka_dilu+15,tloustka_steny]);

	translate([0,hloubka_dilu-tloustka_steny+15,0]) cube([sirka,tloustka_steny+1,vyska]);
		
	translate([0,3.5+30,0]) cube([2.5+tloustka_steny,hloubka_dilu-3.5-15,vyska]);
	translate([sirka-2.5-tloustka_steny,3.5+55,0]) cube([2.5+tloustka_steny,hloubka_dilu-3.5-40,vyska]);

	// Vystuzeni krabicky
	translate([1.9,hloubka_dilu+15,0]) rotate([0,0,0]) rotate([0,0,-90]) cube([5,5,vyska]);
	translate([sirka-1.9,hloubka_dilu+15,0]) rotate([0,0,180]) cube([5,5,vyska]);
	translate([1.9,hloubka_dilu-3-tloustka_steny+15,tloustka_steny]) cube([sirka-2*1.9,3,2]);
}

module power_cuts(){
    // Vyrez pro zdroj
	intersection(){
	  translate([45,hloubka_dilu+10,vyska/2 - 5]) cube([sirka-52,19,vyska]);
	  translate([45+(sirka-52)/2,hloubka_dilu+10,vyska]) rotate([90,0,0]) cylinder(r=25,h=19,$fn=32,center=true);
	}
	
	// Otvor pro srouby na pridelani krytu
	translate([sirka - 9, 10.5 - 1,6+tloustka_steny]) cylinder(r=1.8,h=200,$fn=16,center=true);
	translate([sirka - 9, 10.5 + 1,6+tloustka_steny]) cylinder(r=1.8,h=200,$fn=16,center=true);
	translate([sirka - 9, 10.5,0]) cube([2*1.8,2*1,10],center=true); 
	
	translate([sirka - 69, 8 - 1,6+tloustka_steny]) cylinder(r=1.8,h=200,$fn=16,center=true);
	translate([sirka - 69, 8 + 1,6+tloustka_steny]) cylinder(r=1.8,h=200,$fn=16,center=true);
    translate([sirka - 69, 8,0]) cube([2*1.8,2*1,10],center=true); 
	
	for(i=[10 : 10 : sirka]){
	  translate([i,hloubka_dilu + 5,0]) cylinder(r=1.8,h=10,$fn=16,center=true);
	  translate([i,hloubka_dilu - 10,0]) cylinder(r=1.8,h=10,$fn=16,center=true);
	  translate([i - 1.8,hloubka_dilu - 10,-5]) cube([1.8*2,15,10]);
	}	

	translate([0,15,-0.1]) rotate([0,0,200]) cube([30,20,10]);
	translate([sirka,15,5]) rotate([180,0,-20]) cube([30,20,10]);
	

	// Text RebeliX
	translate([sirka/2,25,-0.1]) rotate([0,0,-180]) mirror([1,0,0]) text_RebeliX(3*layer_height+0.1);
}

module kryt_zdroje_zadni(){
	difference(){
	  power_base();
	  power_cuts();
	}
}

kryt_zdroje_zadni();
